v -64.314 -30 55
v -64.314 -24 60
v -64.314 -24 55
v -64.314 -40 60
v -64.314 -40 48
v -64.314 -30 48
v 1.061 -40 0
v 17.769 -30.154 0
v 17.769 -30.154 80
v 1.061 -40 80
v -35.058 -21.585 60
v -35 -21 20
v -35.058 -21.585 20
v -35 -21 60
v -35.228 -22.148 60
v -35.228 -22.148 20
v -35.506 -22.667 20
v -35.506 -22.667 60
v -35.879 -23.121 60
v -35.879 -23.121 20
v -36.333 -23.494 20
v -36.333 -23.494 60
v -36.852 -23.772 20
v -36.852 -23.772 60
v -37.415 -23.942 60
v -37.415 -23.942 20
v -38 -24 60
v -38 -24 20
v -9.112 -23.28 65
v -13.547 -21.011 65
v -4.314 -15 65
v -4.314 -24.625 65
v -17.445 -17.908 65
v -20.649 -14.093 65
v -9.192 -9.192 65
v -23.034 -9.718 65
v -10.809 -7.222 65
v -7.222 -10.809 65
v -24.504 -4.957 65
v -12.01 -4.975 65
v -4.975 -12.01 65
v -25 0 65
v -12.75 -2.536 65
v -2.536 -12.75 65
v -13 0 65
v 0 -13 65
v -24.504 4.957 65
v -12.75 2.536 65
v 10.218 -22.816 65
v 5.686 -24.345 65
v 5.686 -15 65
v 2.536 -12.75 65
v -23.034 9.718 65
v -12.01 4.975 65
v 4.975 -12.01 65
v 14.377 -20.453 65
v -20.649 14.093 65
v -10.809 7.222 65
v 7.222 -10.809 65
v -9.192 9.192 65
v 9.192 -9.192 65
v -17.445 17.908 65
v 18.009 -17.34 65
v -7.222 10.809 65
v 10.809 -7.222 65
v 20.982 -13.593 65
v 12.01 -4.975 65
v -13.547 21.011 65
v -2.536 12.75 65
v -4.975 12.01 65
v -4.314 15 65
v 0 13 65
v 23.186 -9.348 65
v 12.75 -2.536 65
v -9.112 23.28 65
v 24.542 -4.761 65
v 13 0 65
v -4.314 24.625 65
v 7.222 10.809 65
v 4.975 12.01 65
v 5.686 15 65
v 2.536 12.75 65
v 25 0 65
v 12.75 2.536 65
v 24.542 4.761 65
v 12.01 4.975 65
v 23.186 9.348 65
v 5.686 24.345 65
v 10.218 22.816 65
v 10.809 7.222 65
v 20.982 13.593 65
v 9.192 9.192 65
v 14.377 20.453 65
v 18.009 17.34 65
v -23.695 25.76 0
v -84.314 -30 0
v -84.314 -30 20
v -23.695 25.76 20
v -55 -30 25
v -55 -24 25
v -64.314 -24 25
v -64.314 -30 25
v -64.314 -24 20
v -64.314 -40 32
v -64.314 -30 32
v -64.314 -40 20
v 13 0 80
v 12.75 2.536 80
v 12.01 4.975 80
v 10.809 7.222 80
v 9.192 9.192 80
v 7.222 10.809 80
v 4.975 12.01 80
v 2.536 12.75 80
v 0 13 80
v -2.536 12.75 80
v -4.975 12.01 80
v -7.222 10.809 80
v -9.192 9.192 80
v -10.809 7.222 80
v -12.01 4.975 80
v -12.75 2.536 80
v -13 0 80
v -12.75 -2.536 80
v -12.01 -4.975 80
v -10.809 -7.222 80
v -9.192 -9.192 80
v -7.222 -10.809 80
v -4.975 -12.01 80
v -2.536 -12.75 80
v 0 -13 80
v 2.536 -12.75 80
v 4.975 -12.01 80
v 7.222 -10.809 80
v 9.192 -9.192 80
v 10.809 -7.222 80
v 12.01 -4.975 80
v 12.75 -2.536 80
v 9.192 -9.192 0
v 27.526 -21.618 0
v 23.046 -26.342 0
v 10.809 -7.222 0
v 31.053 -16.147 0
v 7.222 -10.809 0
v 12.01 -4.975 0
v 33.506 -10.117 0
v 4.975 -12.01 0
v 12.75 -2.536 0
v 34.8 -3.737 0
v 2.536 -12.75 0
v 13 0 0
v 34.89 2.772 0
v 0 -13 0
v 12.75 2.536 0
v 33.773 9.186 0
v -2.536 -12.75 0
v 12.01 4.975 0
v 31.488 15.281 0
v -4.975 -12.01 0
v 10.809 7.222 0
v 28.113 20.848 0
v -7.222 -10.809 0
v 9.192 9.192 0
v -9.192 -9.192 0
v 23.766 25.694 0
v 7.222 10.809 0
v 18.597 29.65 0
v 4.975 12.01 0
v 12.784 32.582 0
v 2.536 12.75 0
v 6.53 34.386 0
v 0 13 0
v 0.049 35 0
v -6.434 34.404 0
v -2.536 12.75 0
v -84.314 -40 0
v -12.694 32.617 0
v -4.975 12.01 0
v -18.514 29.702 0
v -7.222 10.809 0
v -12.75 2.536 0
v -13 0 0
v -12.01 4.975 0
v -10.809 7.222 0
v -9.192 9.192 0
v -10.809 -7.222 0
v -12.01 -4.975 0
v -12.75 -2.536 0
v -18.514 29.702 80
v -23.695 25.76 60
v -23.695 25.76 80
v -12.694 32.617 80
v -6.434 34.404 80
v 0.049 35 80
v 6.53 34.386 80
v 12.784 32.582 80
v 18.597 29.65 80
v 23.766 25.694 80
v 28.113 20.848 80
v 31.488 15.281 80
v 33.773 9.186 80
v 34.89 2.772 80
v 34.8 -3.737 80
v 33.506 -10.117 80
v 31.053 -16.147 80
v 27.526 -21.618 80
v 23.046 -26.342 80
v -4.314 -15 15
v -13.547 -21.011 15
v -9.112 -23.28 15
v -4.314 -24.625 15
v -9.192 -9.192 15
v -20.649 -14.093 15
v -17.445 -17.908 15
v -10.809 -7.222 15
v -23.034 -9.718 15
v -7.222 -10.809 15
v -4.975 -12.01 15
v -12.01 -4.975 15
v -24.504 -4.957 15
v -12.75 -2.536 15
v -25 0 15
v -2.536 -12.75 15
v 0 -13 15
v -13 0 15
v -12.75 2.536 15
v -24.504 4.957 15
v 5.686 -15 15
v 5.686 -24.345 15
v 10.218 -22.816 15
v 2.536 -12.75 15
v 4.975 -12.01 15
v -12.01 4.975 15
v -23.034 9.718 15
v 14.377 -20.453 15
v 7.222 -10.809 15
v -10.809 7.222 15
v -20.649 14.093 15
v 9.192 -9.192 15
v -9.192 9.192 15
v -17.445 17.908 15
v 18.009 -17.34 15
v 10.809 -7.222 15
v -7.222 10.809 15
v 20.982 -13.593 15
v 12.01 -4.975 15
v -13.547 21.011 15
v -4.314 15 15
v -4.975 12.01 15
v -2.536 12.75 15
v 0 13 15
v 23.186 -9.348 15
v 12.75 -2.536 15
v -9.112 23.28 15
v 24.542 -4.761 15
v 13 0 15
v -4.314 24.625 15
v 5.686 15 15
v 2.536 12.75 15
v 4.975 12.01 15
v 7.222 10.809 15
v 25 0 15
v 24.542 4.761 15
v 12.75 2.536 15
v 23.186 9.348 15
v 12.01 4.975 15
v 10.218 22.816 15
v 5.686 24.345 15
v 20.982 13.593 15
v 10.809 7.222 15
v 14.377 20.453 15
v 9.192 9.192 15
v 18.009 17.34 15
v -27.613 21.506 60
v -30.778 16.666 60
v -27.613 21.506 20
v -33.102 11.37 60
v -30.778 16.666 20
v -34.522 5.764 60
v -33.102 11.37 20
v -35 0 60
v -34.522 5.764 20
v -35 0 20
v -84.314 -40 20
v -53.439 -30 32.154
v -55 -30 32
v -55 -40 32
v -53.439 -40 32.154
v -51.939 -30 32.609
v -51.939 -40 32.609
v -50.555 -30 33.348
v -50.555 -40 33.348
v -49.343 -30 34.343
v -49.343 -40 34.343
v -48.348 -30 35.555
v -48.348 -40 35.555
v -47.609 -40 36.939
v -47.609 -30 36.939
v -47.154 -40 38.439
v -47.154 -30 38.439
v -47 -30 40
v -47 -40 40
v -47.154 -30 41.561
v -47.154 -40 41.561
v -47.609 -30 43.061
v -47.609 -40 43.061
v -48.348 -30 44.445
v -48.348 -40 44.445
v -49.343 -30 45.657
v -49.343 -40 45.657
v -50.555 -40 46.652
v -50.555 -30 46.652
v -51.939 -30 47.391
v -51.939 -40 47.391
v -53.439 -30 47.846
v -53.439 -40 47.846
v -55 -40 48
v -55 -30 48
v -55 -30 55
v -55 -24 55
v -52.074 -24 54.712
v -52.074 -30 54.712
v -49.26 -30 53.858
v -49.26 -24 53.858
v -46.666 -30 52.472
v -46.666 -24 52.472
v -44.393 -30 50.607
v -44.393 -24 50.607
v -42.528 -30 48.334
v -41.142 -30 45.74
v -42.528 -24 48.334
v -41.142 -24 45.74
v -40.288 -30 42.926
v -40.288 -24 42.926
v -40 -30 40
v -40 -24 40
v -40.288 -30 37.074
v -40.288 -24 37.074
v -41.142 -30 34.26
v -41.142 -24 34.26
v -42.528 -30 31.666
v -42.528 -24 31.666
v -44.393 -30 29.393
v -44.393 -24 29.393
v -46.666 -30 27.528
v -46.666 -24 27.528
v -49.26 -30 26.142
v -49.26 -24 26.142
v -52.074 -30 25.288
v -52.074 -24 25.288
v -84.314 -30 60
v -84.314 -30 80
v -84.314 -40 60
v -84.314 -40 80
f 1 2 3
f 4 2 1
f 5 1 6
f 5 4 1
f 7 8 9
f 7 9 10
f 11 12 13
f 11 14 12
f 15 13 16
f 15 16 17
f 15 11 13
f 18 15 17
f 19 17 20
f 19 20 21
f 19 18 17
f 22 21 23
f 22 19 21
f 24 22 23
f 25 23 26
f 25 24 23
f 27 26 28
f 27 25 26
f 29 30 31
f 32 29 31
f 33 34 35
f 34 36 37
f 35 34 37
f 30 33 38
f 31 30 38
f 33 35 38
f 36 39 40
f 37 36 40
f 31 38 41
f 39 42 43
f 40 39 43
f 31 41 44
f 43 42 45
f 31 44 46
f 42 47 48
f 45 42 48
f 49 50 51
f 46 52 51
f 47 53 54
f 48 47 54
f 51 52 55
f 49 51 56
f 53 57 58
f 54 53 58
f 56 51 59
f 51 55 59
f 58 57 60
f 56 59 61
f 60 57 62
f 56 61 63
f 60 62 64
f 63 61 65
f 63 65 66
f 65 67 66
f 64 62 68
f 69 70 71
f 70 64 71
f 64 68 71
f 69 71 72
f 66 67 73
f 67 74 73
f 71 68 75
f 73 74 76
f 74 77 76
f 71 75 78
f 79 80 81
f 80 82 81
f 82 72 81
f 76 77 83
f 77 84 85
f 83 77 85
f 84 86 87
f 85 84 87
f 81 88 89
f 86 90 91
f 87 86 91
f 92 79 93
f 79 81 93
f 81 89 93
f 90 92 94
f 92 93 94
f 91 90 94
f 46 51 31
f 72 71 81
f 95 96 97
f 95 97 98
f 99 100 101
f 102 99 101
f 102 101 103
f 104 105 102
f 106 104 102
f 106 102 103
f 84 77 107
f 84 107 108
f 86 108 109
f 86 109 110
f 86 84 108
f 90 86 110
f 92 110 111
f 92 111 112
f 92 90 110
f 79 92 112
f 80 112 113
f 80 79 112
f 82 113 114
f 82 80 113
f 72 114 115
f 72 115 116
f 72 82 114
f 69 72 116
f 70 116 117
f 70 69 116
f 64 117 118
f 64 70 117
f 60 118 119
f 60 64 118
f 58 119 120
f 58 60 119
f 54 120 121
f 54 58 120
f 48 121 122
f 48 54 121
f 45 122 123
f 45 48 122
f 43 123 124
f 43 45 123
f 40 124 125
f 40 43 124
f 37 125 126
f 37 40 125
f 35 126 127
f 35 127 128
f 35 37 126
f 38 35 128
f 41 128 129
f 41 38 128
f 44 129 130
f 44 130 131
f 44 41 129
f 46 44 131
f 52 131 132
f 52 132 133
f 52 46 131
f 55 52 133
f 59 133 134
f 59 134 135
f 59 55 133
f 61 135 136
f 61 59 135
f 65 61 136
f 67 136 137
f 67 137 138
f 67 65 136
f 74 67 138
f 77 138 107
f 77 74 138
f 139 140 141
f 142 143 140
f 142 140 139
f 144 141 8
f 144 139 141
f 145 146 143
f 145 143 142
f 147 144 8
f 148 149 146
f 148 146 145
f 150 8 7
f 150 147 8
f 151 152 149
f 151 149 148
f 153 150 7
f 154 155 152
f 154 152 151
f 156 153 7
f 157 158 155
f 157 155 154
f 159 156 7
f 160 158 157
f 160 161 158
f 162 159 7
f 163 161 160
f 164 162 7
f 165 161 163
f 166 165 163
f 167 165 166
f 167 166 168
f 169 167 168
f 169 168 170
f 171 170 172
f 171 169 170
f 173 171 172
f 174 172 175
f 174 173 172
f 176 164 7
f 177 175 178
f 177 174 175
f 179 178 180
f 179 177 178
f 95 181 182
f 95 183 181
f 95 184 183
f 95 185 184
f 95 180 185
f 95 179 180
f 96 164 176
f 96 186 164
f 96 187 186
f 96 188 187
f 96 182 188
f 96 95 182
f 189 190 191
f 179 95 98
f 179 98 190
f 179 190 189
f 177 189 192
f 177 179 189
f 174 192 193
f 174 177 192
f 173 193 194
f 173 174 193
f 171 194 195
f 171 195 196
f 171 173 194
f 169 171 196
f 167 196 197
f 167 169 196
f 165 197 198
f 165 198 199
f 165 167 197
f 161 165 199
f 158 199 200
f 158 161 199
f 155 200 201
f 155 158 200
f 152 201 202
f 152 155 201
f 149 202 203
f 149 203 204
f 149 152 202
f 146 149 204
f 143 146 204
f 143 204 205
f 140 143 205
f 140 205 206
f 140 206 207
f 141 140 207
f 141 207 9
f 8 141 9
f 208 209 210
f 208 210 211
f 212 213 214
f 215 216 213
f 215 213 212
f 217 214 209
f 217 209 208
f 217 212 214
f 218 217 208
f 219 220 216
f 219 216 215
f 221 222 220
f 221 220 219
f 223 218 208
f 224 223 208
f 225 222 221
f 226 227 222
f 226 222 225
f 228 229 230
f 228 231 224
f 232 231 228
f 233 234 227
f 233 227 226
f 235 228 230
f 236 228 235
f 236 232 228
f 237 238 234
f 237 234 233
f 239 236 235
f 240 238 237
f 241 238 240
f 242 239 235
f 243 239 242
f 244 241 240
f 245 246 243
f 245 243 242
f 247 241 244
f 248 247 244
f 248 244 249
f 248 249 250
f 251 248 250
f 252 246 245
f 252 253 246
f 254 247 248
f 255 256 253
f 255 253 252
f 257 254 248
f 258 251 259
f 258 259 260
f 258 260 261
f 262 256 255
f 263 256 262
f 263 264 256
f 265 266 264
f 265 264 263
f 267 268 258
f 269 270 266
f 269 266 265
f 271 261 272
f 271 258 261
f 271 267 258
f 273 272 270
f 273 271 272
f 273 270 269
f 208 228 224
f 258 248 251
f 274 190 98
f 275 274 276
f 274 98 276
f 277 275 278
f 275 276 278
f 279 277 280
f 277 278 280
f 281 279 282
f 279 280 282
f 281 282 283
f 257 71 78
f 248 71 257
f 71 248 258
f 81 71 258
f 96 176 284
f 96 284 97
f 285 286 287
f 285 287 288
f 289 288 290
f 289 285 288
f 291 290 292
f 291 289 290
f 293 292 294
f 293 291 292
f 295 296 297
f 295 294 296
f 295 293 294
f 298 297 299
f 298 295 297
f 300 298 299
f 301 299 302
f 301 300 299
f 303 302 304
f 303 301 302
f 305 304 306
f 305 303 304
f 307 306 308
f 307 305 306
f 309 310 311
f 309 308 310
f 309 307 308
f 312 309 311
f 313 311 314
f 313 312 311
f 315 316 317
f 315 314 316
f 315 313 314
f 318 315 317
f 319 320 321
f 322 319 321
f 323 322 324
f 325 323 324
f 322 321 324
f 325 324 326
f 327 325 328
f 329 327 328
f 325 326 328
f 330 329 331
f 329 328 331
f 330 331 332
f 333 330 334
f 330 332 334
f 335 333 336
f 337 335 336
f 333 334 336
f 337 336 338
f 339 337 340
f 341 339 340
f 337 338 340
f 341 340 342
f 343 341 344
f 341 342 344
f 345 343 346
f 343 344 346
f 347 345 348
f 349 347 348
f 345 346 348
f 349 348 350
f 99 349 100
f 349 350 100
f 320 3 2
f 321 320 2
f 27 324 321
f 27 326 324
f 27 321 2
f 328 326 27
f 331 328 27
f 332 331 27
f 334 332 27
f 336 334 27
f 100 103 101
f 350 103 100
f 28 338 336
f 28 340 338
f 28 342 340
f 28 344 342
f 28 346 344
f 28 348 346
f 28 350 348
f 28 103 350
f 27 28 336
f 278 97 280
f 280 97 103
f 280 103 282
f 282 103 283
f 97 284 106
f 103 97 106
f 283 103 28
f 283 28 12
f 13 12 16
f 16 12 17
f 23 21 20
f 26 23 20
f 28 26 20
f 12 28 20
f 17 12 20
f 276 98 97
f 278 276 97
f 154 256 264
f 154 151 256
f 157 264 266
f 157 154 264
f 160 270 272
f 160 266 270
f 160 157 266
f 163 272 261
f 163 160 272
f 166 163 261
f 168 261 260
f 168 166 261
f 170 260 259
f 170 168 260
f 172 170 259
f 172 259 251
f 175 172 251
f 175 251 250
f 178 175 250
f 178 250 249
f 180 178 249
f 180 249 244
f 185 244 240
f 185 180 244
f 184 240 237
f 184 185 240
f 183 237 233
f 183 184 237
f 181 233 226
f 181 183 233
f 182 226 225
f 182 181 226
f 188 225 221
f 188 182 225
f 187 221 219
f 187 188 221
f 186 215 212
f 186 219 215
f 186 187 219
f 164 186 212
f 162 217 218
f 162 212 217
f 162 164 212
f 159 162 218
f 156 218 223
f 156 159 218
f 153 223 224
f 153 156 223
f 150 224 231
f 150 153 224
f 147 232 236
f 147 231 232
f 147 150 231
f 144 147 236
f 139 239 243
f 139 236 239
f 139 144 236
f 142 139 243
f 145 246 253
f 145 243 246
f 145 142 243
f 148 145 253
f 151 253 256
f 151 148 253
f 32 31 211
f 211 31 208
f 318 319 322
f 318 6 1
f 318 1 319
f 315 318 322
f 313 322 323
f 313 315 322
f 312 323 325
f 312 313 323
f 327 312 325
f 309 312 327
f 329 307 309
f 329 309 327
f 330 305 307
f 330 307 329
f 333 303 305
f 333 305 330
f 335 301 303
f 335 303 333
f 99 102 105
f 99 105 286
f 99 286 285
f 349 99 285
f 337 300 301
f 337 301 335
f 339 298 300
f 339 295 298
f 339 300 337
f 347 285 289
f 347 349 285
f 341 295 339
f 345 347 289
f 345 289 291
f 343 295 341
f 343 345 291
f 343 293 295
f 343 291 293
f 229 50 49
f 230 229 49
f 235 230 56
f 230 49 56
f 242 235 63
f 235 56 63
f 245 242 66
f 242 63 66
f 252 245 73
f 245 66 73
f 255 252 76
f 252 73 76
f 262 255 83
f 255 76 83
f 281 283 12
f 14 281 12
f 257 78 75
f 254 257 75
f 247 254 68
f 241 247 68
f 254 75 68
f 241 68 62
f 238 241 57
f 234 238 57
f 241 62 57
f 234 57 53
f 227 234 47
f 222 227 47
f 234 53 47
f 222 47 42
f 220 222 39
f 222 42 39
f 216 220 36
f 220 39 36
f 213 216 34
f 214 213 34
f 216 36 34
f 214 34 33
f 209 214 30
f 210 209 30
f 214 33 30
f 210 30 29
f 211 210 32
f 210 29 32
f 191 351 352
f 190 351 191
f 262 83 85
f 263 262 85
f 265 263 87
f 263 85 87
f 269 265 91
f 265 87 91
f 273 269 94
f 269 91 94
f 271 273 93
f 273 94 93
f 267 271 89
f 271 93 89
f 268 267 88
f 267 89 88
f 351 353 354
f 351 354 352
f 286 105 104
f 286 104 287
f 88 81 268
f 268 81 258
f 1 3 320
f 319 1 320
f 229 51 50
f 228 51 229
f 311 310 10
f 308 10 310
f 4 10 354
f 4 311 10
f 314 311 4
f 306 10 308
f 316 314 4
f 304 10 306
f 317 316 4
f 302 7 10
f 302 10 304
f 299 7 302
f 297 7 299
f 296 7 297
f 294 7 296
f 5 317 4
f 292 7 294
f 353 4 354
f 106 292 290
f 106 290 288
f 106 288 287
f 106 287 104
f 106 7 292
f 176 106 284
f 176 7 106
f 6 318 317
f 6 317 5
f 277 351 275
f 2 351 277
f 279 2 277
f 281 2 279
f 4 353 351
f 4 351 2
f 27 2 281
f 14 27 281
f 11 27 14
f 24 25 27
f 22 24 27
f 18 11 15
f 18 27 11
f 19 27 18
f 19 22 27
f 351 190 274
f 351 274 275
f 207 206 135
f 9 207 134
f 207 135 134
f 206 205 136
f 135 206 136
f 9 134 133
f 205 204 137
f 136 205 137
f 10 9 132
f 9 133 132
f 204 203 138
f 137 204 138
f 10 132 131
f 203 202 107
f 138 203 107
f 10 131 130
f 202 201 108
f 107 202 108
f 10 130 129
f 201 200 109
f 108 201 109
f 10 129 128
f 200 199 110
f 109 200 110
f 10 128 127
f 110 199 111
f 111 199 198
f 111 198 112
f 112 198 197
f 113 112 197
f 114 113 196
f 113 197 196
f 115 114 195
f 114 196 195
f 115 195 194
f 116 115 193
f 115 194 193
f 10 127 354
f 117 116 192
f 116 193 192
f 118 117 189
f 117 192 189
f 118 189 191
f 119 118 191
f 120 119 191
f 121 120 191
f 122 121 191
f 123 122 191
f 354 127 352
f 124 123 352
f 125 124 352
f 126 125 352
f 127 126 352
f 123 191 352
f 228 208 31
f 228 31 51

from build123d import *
from build123d.topology import SkipClean

# Parameters (mm, degrees)
EXTRUDE_1_DEPTH          = 80
SKETCH_2_R               = 13
CUT_EXTRUDE_2_DEPTH      = 15
CUT_EXTRUDE_START        = -15
SKETCH_4_R               = 13
CUT_EXTRUDE_3_DEPTH      = 15
CUT_EXTRUDE_4_DEPTH      = 123.918354375
CUT_EXTRUDE_4_DEPTH_BACK = 123.918354375
SKETCH_5_W               = 20
SKETCH_5_H               = 40
CUT_EXTRUDE_6_DEPTH      = 123.918354375
CUT_EXTRUDE_6_DEPTH_BACK = 24
CUT_EXTRUDE_7_DEPTH      = 131.345394404
CUT_EXTRUDE_8_DEPTH      = 32
CUT_EXTRUDE_8_DEPTH_BACK = 24
SKETCH_10_W              = 30
SKETCH_10_H              = 40
CUT_EXTRUDE_9_DEPTH      = 6
SKETCH_13_W              = 10.619852086
SKETCH_13_H              = 40
CUT_EXTRUDE_10_DEPTH     = 71
EXTRUDE_3_DEPTH          = 60
FILLET_1_R               = 3
SKETCH_14_R              = 25
CUT_EXTRUDE_11_DEPTH     = 50
CUT_EXTRUDE_START_2      = -95
SKETCH_16_R              = 13
CUT_EXTRUDE_12_DEPTH     = 95
SKETCH_17_W              = 10
SKETCH_17_H              = 50
EXTRUDE_4_DEPTH          = 16
SKETCH_20_W              = 10
SKETCH_20_H              = 50
EXTRUDE_5_DEPTH          = 20


with BuildPart() as part:
    # Эскиз1 → Бобышка-Вытянуть1 (new body)
    with BuildSketch(Plane.XY):
        with BuildLine():
            Line((-84.314422505, -30), (-23.694570419, 25.759800711))
            ThreePointArc((-23.694570419, 25.759800711), (28.113366731, 20.847988178), (17.769230769, -30.153846154))
            Line((17.769230769, -30.153846154), (1.060606061, -40))
            Line((1.060606061, -40), (-84.314422505, -40))
            Line((-84.314422505, -40), (-84.314422505, -30))
        make_face()
    extrude(amount=EXTRUDE_1_DEPTH)

    # Эскиз2 → Вырез-Вытянуть2 (cut)
    with BuildSketch(Plane.XY):
        Circle(SKETCH_2_R)
    extrude(amount=CUT_EXTRUDE_2_DEPTH, mode=Mode.SUBTRACT)

    # Эскиз4 → Вырез-Вытянуть3 (cut)
    with BuildSketch(Plane.XY.offset(80).offset(CUT_EXTRUDE_START)):
        Circle(SKETCH_4_R)
    extrude(amount=CUT_EXTRUDE_3_DEPTH, mode=Mode.SUBTRACT)

    # Эскиз5 → Вырез-Вытянуть4 (cut, two sides: drawn at the far end of the back side and taken through both)
    with BuildSketch(Plane(origin=(0, 0, 0), x_dir=(1, 0, 0), z_dir=(0, 1, 0)).offset(-CUT_EXTRUDE_4_DEPTH_BACK)):
        with Locations((-74.314422505, -40)):
            Rectangle(SKETCH_5_W, SKETCH_5_H)
    extrude(amount=CUT_EXTRUDE_4_DEPTH + CUT_EXTRUDE_4_DEPTH_BACK, mode=Mode.SUBTRACT)

    # Эскиз6 → Вырез-Вытянуть6 (cut, two sides: drawn at the far end of the back side and taken through both)
    with BuildSketch(Plane(origin=(0, 0, 0), x_dir=(1, 0, 0), z_dir=(0, 1, 0)).offset(-CUT_EXTRUDE_6_DEPTH_BACK)):
        with BuildLine():
            Line((-55, -25), (-84.314422505, -25))
            Line((-84.314422505, -25), (-84.314422505, -55))
            Line((-84.314422505, -55), (-55, -55))
            ThreePointArc((-55, -55), (-40, -40), (-55, -25))
        make_face()
    extrude(amount=CUT_EXTRUDE_6_DEPTH + CUT_EXTRUDE_6_DEPTH_BACK, mode=Mode.SUBTRACT)

    # Эскиз9 → Вырез-Вытянуть7 (cut, through all)
    with BuildSketch(Plane(origin=(0, -24, 0), x_dir=(1, 0, 0), z_dir=(0, 1, 0))):
        with BuildLine():
            Line((-55, -48), (-92.733432528, -48))
            Line((-92.733432528, -48), (-92.733432528, -32))
            Line((-92.733432528, -32), (-55, -32))
            ThreePointArc((-55, -32), (-47, -40), (-55, -48))
        make_face()
    extrude(amount=-CUT_EXTRUDE_7_DEPTH, mode=Mode.SUBTRACT)

    # Эскиз10 → Вырез-Вытянуть8 (cut, two sides: drawn at the far end of the back side and taken through both)
    with BuildSketch(Plane(origin=(0, 0, 0), x_dir=(1, 0, 0), z_dir=(0, 1, 0)).offset(-CUT_EXTRUDE_8_DEPTH_BACK)):
        with Locations((-49.314422505, -40)):
            Rectangle(SKETCH_10_W, SKETCH_10_H)
    extrude(amount=CUT_EXTRUDE_8_DEPTH + CUT_EXTRUDE_8_DEPTH_BACK, mode=Mode.SUBTRACT)

    # Эскиз11 → Вырез-Вытянуть9 (cut)
    with BuildSketch(Plane(origin=(0, -24, 0), x_dir=(1, 0, 0), z_dir=(0, 1, 0))):
        with BuildLine():
            Line((-55, -25), (-81.861005174, -25))
            Line((-81.861005174, -25), (-81.861005174, -55))
            Line((-81.861005174, -55), (-55, -55))
            ThreePointArc((-55, -55), (-40, -40), (-55, -25))
        make_face()
    extrude(amount=-CUT_EXTRUDE_9_DEPTH, mode=Mode.SUBTRACT)

    # Эскиз13 → Вырез-Вытянуть10 (cut)
    with BuildSketch(Plane(origin=(0, -24, 0), x_dir=(1, 0, 0), z_dir=(0, 1, 0))):
        with Locations((-29.004496462, -40)):
            Rectangle(SKETCH_13_W, SKETCH_13_H)
    extrude(amount=CUT_EXTRUDE_10_DEPTH, mode=Mode.SUBTRACT)

    # Эскиз12 → Бобышка-Вытянуть3 (add)
    with SkipClean():  # the faces are left unmerged after this step: merging them gives an invalid solid
        with BuildSketch(Plane.XY):
            with BuildLine():
                Line((-35, 0), (-35, -24))
                Line((-35, -24), (-25.475478406, -24))
                ThreePointArc((-25.475478406, -24), (32.53184397, 12.9104271), (-35, 0))
            make_face()
        extrude(amount=EXTRUDE_3_DEPTH)

    # Скругление1
    fillet_1_edges = [part.edges().sort_by_distance(p)[0] for p in [
        (-35, -24, 40),
    ]]
    fillet(fillet_1_edges, radius=FILLET_1_R)

    # Эскиз14 → Вырез-Вытянуть11 (cut)
    with SkipClean():  # the faces are left unmerged after this step: merging them gives an invalid solid
        with BuildSketch(Plane.XY.offset(65)):
            Circle(SKETCH_14_R)
        extrude(amount=-CUT_EXTRUDE_11_DEPTH, mode=Mode.SUBTRACT)

    # Эскиз16 → Вырез-Вытянуть12 (cut)
    with SkipClean():  # the faces are left unmerged after this step: merging them gives an invalid solid
        with BuildSketch(Plane.XY.offset(80).offset(CUT_EXTRUDE_START_2)):
            Circle(SKETCH_16_R)
        extrude(amount=CUT_EXTRUDE_12_DEPTH, mode=Mode.SUBTRACT)

    # Эскиз17 → Бобышка-Вытянуть4 (add)
    with SkipClean():  # the faces are left unmerged after this step: merging them gives an invalid solid
        with BuildSketch(Plane(origin=(0, 15, 0), x_dir=(1, 0, 0), z_dir=(0, 1, 0))):
            with Locations((0.685577495, -40)):
                Rectangle(SKETCH_17_W, SKETCH_17_H)
        extrude(amount=EXTRUDE_4_DEPTH)

    # Эскиз20 → Бобышка-Вытянуть5 (add)
    with SkipClean():  # the faces are left unmerged after this step: merging them gives an invalid solid
        with BuildSketch(Plane(origin=(0, -15, 0), x_dir=(1, 0, 0), z_dir=(0, 1, 0))):
            with Locations((0.685577495, -40)):
                Rectangle(SKETCH_20_W, SKETCH_20_H)
        extrude(amount=-EXTRUDE_5_DEPTH)


solid = part.part
